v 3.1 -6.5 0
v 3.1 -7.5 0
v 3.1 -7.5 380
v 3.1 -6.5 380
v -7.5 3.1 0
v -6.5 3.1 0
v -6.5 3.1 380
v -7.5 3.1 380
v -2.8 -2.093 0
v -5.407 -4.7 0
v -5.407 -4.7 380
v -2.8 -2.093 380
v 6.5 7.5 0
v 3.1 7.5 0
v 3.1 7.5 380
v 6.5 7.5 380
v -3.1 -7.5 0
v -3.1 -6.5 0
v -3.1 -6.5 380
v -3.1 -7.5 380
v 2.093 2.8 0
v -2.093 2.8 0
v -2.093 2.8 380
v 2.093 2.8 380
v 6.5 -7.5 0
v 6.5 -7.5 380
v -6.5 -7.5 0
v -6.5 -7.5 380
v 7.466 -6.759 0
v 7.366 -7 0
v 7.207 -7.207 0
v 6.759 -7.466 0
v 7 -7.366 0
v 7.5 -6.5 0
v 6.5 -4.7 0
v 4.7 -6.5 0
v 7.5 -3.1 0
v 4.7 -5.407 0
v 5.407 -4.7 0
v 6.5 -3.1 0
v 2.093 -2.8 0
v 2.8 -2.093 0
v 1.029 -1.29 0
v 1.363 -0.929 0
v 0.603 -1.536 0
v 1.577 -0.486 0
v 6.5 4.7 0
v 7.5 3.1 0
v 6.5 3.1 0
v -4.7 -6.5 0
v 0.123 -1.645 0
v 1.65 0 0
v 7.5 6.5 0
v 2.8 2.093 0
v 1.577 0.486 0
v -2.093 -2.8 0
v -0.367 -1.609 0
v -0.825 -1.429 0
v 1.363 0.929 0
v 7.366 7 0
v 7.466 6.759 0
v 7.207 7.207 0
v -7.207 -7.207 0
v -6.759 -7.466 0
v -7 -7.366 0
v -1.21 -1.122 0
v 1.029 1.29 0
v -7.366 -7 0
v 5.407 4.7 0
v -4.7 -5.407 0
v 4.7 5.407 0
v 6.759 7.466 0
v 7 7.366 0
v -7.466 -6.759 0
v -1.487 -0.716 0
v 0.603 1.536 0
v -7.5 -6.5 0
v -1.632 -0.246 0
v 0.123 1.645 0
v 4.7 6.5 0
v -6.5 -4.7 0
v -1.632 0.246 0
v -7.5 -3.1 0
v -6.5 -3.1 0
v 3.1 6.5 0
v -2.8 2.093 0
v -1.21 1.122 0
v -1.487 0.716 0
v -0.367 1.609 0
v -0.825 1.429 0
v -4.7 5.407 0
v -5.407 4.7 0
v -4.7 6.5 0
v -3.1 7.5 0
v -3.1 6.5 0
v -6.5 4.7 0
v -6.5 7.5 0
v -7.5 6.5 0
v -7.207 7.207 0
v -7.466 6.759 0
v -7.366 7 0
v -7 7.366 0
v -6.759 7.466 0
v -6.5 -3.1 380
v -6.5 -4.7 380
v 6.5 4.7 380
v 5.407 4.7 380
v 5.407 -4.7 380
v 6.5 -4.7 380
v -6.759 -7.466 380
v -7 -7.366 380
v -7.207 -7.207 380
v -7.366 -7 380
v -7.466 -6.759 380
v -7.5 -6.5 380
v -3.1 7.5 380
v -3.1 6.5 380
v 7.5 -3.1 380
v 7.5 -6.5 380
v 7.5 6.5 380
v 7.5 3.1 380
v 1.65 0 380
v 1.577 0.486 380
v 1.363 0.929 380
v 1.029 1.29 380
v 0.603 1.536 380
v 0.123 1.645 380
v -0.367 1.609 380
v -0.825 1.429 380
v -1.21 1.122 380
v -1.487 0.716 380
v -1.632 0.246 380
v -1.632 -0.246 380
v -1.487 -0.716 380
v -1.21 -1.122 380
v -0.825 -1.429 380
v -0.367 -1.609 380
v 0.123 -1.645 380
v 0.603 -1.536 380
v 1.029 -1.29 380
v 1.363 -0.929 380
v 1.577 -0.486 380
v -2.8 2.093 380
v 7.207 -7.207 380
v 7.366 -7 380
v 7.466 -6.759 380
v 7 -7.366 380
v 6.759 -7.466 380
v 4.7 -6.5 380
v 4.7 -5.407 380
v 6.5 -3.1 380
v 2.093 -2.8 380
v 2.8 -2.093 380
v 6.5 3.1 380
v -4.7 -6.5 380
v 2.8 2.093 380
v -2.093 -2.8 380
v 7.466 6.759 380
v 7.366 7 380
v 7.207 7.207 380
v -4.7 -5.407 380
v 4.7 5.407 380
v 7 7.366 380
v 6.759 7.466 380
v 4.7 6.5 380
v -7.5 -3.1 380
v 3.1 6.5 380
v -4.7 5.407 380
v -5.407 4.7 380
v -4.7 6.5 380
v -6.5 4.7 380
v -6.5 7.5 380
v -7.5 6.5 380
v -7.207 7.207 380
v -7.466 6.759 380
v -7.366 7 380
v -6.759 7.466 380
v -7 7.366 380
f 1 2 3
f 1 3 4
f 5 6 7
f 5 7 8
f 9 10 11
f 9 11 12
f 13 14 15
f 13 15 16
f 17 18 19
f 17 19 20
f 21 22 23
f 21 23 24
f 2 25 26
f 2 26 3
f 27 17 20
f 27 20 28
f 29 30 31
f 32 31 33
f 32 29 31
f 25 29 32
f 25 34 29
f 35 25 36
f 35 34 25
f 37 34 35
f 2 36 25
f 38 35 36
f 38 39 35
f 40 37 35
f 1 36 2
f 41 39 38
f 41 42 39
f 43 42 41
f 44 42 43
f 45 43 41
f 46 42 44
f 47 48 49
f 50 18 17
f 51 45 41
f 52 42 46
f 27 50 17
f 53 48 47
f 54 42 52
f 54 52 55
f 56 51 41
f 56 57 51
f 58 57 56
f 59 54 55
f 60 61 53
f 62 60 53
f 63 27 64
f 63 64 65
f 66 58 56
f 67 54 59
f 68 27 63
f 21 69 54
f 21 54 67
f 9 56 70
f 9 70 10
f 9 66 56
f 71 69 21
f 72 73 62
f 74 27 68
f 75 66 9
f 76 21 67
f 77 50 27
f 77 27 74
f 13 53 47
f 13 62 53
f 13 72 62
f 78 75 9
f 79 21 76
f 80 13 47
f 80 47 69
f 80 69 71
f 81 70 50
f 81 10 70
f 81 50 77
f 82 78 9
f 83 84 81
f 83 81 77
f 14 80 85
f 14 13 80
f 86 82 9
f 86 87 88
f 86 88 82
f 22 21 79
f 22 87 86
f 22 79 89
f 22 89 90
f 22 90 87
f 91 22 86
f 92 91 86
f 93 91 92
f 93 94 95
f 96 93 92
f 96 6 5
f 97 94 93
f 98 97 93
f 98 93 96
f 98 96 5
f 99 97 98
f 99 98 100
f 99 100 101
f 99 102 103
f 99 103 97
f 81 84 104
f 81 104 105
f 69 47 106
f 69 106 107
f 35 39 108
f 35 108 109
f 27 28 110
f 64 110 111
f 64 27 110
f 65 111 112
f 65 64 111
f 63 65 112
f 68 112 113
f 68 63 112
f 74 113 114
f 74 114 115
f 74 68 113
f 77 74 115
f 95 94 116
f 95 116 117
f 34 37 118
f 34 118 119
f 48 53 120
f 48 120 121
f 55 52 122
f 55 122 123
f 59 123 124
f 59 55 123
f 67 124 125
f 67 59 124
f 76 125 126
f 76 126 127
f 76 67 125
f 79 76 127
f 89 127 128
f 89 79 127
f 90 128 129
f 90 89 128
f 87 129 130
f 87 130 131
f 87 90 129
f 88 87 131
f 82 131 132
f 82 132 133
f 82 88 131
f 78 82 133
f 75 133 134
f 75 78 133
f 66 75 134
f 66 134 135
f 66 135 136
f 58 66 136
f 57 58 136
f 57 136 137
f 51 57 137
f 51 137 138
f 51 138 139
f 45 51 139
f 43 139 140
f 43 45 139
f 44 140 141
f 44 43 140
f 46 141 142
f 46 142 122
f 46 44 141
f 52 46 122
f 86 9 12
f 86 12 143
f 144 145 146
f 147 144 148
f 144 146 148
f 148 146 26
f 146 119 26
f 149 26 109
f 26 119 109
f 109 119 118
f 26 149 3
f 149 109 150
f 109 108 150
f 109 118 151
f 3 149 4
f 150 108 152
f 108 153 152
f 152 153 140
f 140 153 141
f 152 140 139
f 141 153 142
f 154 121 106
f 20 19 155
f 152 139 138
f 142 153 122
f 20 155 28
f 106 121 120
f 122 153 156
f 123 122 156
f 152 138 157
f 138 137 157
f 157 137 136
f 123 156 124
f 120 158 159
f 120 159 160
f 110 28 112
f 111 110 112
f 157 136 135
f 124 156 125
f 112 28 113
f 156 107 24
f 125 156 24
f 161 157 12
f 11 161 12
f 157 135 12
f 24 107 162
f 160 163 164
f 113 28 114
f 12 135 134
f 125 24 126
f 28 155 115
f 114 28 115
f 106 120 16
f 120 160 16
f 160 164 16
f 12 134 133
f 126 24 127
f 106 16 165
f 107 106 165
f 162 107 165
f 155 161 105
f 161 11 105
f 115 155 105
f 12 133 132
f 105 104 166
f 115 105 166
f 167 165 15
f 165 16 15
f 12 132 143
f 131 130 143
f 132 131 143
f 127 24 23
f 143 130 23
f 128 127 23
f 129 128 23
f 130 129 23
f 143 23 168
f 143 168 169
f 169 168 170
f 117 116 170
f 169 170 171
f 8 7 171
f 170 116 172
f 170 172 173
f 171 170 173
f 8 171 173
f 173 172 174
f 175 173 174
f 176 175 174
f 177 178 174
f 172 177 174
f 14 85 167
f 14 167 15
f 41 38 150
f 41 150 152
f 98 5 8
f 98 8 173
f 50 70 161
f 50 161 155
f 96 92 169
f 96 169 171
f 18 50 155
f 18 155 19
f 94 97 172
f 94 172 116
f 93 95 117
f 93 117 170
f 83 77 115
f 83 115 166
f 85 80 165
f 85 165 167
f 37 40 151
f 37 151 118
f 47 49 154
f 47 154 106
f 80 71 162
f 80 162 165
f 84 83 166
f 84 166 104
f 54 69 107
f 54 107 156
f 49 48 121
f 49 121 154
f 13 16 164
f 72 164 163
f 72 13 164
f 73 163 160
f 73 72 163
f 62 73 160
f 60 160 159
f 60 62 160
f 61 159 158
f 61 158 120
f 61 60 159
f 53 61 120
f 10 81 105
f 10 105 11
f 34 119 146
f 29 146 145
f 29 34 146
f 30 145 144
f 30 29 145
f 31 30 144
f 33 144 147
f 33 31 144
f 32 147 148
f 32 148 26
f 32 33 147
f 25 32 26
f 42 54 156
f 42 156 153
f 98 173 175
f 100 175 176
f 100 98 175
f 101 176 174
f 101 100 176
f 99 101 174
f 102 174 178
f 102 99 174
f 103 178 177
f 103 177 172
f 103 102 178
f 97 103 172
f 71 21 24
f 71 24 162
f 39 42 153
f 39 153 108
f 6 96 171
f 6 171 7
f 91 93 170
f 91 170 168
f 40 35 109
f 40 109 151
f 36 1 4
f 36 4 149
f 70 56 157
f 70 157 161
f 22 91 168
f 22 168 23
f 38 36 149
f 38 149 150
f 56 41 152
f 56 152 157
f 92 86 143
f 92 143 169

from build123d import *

# Parameters (mm, degrees)
SKETCH_1_R      = 1.65
EXTRUDE_1_DEPTH = 380


with BuildPart() as part:
    # 草图1 → 凸台-拉伸1 (new body)
    with BuildSketch(Plane.XY):
        with BuildLine():
            Line((-2.092893219, 2.8), (2.092893219, 2.8))
            Line((2.092893219, 2.8), (4.7, 5.407106781))
            Line((4.7, 5.407106781), (4.7, 6.5))
            Line((4.7, 6.5), (3.1, 6.5))
            Line((3.1, 6.5), (3.1, 7.5))
            Line((3.1, 7.5), (6.5, 7.5))
            ThreePointArc((6.5, 7.5), (7.207106781, 7.207106781), (7.5, 6.5))
            Line((7.5, 6.5), (7.5, 3.1))
            Line((7.5, 3.1), (6.5, 3.1))
            Line((6.5, 3.1), (6.5, 4.7))
            Line((6.5, 4.7), (5.407106781, 4.7))
            Line((5.407106781, 4.7), (2.8, 2.092893219))
            Line((2.8, 2.092893219), (2.8, -2.092893219))
            Line((2.8, -2.092893219), (5.407106781, -4.7))
            Line((5.407106781, -4.7), (6.5, -4.7))
            Line((6.5, -4.7), (6.5, -3.1))
            Line((6.5, -3.1), (7.5, -3.1))
            Line((7.5, -3.1), (7.5, -6.5))
            ThreePointArc((7.5, -6.5), (7.207106781, -7.207106781), (6.5, -7.5))
            Line((6.5, -7.5), (3.1, -7.5))
            Line((3.1, -7.5), (3.1, -6.5))
            Line((3.1, -6.5), (4.7, -6.5))
            Line((4.7, -6.5), (4.7, -5.407106781))
            Line((4.7, -5.407106781), (2.092893219, -2.8))
            Line((2.092893219, -2.8), (-2.092893219, -2.8))
            Line((-2.092893219, -2.8), (-4.7, -5.407106781))
            Line((-4.7, -5.407106781), (-4.7, -6.5))
            Line((-4.7, -6.5), (-3.1, -6.5))
            Line((-3.1, -6.5), (-3.1, -7.5))
            Line((-3.1, -7.5), (-6.5, -7.5))
            ThreePointArc((-6.5, -7.5), (-7.207106781, -7.207106781), (-7.5, -6.5))
            Line((-7.5, -6.5), (-7.5, -3.1))
            Line((-7.5, -3.1), (-6.5, -3.1))
            Line((-6.5, -3.1), (-6.5, -4.7))
            Line((-6.5, -4.7), (-5.407106781, -4.7))
            Line((-5.407106781, -4.7), (-2.8, -2.092893219))
            Line((-2.8, -2.092893219), (-2.8, 2.092893219))
            Line((-2.8, 2.092893219), (-5.407106781, 4.7))
            Line((-5.407106781, 4.7), (-6.5, 4.7))
            Line((-6.5, 4.7), (-6.5, 3.1))
            Line((-6.5, 3.1), (-7.5, 3.1))
            Line((-7.5, 3.1), (-7.5, 6.5))
            ThreePointArc((-7.5, 6.5), (-7.207106781, 7.207106781), (-6.5, 7.5))
            Line((-6.5, 7.5), (-3.1, 7.5))
            Line((-3.1, 7.5), (-3.1, 6.5))
            Line((-3.1, 6.5), (-4.7, 6.5))
            Line((-4.7, 6.5), (-4.7, 5.407106781))
            Line((-4.7, 5.407106781), (-2.092893219, 2.8))
        make_face()
        Circle(SKETCH_1_R, mode=Mode.SUBTRACT)
    extrude(amount=EXTRUDE_1_DEPTH)


solid = part.part
